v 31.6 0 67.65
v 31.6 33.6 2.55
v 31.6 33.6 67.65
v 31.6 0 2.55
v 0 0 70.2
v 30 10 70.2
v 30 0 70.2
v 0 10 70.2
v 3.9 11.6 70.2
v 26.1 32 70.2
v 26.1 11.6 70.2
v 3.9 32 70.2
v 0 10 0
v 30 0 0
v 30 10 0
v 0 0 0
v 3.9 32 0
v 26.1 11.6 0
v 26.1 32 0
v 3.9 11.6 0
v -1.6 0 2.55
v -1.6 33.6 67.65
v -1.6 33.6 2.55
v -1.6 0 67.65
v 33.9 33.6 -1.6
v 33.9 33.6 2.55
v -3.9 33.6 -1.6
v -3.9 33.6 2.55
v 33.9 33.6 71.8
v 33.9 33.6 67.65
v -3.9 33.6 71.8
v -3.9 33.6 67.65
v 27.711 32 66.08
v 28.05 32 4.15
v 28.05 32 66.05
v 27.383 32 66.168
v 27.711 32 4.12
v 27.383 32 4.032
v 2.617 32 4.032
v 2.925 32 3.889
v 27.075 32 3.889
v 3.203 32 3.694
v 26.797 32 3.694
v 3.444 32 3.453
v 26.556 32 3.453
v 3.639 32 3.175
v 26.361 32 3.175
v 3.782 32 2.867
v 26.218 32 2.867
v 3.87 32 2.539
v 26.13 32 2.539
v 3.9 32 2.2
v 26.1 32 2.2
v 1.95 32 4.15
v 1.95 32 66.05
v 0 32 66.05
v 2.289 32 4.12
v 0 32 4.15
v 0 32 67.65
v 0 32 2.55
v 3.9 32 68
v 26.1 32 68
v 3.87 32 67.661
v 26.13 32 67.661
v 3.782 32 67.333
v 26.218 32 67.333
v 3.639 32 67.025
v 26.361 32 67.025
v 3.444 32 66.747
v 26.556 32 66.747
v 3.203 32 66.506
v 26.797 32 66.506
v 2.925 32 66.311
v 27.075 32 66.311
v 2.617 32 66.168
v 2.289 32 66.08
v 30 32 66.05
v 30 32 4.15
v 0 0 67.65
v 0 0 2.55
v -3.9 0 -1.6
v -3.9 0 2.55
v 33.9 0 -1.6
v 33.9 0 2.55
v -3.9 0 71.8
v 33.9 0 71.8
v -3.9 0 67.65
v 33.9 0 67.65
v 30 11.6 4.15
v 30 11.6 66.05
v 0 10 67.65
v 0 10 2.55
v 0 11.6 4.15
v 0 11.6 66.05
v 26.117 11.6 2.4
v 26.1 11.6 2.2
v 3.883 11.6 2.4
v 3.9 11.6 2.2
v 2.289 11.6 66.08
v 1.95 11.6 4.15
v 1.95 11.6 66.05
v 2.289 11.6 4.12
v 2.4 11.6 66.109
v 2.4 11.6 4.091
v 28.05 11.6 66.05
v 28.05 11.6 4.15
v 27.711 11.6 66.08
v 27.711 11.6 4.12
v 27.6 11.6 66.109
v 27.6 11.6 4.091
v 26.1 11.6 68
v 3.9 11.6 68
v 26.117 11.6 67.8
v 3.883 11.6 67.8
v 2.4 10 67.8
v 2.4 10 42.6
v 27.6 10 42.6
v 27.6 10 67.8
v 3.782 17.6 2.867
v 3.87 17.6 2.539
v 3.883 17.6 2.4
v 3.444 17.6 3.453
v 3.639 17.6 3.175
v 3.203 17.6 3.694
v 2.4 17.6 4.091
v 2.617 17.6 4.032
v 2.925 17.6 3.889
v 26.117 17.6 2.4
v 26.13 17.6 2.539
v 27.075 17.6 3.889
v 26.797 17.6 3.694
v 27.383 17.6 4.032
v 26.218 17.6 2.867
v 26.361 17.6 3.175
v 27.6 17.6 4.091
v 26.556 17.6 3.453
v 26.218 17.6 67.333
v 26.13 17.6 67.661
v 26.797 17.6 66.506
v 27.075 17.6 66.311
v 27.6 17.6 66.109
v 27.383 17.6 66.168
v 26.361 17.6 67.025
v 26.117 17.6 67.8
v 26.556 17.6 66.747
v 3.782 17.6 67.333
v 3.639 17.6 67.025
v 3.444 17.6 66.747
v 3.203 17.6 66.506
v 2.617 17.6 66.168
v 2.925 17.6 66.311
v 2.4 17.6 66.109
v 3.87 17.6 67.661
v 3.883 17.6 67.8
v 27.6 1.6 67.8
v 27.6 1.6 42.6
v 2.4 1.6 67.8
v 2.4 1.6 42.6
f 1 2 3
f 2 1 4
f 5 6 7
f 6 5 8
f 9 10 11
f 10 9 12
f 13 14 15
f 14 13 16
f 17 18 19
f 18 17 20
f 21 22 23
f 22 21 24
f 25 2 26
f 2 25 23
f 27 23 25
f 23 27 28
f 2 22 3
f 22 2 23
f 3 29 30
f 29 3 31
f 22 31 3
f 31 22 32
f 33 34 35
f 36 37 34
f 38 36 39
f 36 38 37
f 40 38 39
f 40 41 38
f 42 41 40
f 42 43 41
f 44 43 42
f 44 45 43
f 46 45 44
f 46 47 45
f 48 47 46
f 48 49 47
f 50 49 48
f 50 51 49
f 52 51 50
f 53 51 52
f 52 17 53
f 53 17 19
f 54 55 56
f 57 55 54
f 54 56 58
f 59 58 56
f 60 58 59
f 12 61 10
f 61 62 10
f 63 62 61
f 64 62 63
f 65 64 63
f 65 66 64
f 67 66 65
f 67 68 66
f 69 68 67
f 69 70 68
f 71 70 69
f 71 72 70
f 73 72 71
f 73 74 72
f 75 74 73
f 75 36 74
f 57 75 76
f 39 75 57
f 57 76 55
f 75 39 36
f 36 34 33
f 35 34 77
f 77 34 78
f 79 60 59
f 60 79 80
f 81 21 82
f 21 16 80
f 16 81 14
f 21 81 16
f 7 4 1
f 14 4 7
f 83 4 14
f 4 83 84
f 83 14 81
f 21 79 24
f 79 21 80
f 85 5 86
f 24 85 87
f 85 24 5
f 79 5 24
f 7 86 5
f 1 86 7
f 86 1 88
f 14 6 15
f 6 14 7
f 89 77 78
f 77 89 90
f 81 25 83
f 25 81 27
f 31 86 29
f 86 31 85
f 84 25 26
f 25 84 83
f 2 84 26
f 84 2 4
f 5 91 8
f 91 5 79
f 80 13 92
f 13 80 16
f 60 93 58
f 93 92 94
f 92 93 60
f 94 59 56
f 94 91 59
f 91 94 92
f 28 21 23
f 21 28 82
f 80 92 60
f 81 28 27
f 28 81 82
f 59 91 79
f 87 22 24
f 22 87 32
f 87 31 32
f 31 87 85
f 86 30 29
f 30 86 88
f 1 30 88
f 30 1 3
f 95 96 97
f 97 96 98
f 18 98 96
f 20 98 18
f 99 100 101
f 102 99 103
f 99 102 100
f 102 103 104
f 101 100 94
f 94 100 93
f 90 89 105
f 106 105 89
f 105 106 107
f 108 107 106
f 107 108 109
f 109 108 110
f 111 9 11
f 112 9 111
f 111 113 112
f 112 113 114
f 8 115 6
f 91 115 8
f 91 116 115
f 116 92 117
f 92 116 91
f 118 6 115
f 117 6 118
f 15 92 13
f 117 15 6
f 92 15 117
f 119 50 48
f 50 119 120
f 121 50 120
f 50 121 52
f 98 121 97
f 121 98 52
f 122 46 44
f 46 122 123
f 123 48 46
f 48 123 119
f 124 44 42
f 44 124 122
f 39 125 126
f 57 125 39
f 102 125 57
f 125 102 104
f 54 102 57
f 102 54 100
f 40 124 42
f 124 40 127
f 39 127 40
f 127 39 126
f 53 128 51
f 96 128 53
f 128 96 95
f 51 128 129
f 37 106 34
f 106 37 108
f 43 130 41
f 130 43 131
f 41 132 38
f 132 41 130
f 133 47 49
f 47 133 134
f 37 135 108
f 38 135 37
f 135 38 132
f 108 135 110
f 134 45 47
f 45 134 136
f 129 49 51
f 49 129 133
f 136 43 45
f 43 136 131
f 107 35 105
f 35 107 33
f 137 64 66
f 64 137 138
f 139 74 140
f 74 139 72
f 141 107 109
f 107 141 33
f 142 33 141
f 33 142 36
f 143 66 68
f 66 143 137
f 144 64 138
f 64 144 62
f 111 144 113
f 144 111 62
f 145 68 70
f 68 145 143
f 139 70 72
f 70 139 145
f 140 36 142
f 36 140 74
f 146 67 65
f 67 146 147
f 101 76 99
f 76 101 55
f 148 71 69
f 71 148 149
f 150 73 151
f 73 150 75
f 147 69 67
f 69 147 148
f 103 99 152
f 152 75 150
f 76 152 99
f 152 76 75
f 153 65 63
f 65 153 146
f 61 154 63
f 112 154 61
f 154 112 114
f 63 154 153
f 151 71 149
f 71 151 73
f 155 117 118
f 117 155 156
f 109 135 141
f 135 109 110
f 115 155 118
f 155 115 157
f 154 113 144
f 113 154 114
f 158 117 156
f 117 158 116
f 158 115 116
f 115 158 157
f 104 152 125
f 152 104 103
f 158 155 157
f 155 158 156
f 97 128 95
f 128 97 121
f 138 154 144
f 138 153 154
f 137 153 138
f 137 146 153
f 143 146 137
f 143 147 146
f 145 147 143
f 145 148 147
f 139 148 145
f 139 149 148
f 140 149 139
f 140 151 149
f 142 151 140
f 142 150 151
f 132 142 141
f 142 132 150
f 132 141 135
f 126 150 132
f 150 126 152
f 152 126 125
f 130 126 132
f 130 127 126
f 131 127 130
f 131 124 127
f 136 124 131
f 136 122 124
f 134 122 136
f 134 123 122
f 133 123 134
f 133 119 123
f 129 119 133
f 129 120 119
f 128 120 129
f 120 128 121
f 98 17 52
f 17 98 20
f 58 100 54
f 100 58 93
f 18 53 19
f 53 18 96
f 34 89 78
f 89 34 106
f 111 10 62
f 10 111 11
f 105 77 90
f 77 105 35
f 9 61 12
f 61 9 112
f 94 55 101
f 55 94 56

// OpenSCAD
$fn=36;
/* [Platine] */
//Gehäuse anzeigen
showcase=true;
//Platine anzeigen
showplatine=true;
//platine länge
pl=70.2;
//platine breite
pw=30;
//lochrand zu lochrand länge
la=68;
//lochrand zu lochrand breite
lab=28.3;
//abstand löcher zum platinenrand in der breite
arb=(pw-lab)/2;
//abstand löcher zum platinenrand in der länge
arl=(pl-la)/2;
//lochdurchmesser
ld=2.2;
//platinendicke
pd=1.6;
//höhe leds mit platinendicke pd
hled=10;
//höhe widerstände mit platinendicke
hw = 5;
//höhe lötzinn mit platinendicke (natürlich von anderer seite)
hz = 6;
//led fläche ca. 25.2 mal 25.2
ledf = 25.2;
//nur die leds (irgendein zylinder mit alutfolie als spiegel :)
ledfi = 18;
//lochdurchmesser schalter
ls = 5; 
//lochdurchmesser buchse
lb = 8;
//schalterbreite max
sbm = 12;
//buchsebreite max
bbm = 12;
//mindesttiefe für schalter und buchse
ts = 25; 
//thickness
t = 1.6;
//Toleranz
to = 4;
//schrauben gewinde innen
sgi = 1.5;
//schraubenlänge
sl = 7.0;
/* [Hidden] */
//Lochzentrum Breite = Radius des Loches + Abstand Rand der Breite
lzb = ld/2+arb;
//Dasselbe für Länge
lzl = ld/2+arl;
//Lz ist der kleiner der beiden Werte
lz = lzb<lzl ? lzb : lzl;
//Die Höhe der LEDs, (mit Platine), die Höhe des Lötzinns, zusätzlicher Puffer)
cd = hled+hz+sbm+to;
//hinter der platine (gleich cd?)
cd2 = (hz-pd)+sbm+to;

//w = inner width of case
//h = inner height of case
//d = inner depth of case
//t = thickness of walls
module case(w, h, d, t)
{
    color("gray")
    //das ganze ein nach links, dann müssen wir bei anderen sachen nicht so viel über die t nachdenken, inkl. toleranzen
    translate([-t,0,0])
    {
        backwall(w,t,h,d);
        leftwall(t,d,h);
        rightwall(t,d,h,w);
        bottomwall(w,d,t);
        topwall(w,d,t,h);
    }
    
    translate([pw,0,-t])
    cube([lzb+lz,cd+t,lzl+lz]);
    
    translate([-lzb-lz,0,-t])
    cube([lzb+lz,cd+t,lzl+lz]);
    
    translate([-lzb-lz,0,pl-lzl-lz+t])
    cube([lzb+lz,cd+t,lzl+lz]);
    
    translate([pw,0,pl-lzl-lz+t])
    cube([lzb+lz,cd+t,lzl+lz]);
}

module backwall(w, t, h, d )
{
    translate([0,d,0])
    cube([w+2*t,t,h]);
}
module leftwall(t, d, h)
{
    cube([t,d,h]);
}
module rightwall(t, d, h, w)
{
    translate([t+w,0,0])
    cube([t,d,h]);
}
module bottomwall(w,d,t)
{
    translate([0,0,-t])
    cube([w+2*t,d+t,t]);
}
module topwall(w,d,t,h)
{
    translate([0,0,h])
    cube([w+2*t,d+t,t]);
}

//pw
//pl
if (showcase)
{
    case(pw,pl,cd,t);
}

//breite der platine = pw
//hoehe der platine = ph
//dicke der platine = pd
module platinenplatte(pw,ph,pd)
{
    color("green")
    cube([pw,pd,ph]);
}

module leds()
{
   translate([0,-(hled-pd),0])
   cube([ledf,hled,ledf]); 
}

module loetzinn()
{
    leda = (pw-ledf)/2;
    
    translate([leda,pd,leda])
    cube([ledf,hz,pl-leda*2]);
}

module leds_nachtlicht()
{
    leda = (pw-ledf)/2;//abstand der großzügigen led fläche zu den rändern oben
    translate([leda,0,pl-ledf-leda])
    color("#6600FF")
    leds();
}

module platine()
{
    if (showplatine)
    {
        platinenplatte(pw,pl,pd);
    }
    translate([0,pd,0])
    cube([lzb+lz,cd2,lzl]);
    translate([0,pd,0])
    cube([lzb,cd2,lzl+lz]);
    
    translate([pw-lzb-lz,pd,0])
    cube([lzb+lz,cd2,lzl]);
    translate([pw-lzb,pd,0])
    cube([lzb,cd2,lzl+lz]);
    
    translate([pw-lzb-lz,pd,pl-lzl])
    cube([lzb+lz,cd2,lzl]);
    translate([pw-lzb,pd,pl-lzl-lz])
    cube([lzb,cd2,lzl+lz]);
    
    translate([0,pd,pl-lzl])
    cube([lzb+lz,cd2,lzl]);
    translate([0,pd,pl-lzl-lz])
    cube([lzb,cd2,lzl+lz]);
       
    translate([lzb,0,lzl])
    {    
        if (showplatine)
        {
            platinenloecher(pd,ld);
        }
        schraubenloecher();
        schraubenhalter();
        //verbinder();        
    }    
    translate([pw-lzb,0,lzl])
    {    
        if (showplatine)
        {
            platinenloecher(pd,ld);
        }
        schraubenloecher();
        schraubenhalter();
    }
    translate([pw-lzb,0,pl-lzl])
    {    
        if (showplatine)
        {
            platinenloecher(pd,ld);
        }
        schraubenloecher();
        schraubenhalter();
    }
    translate([lzb,0,pl-lzl])
    {    
        if (showplatine)
        {
            platinenloecher(pd,ld);
        }
        schraubenloecher();
        schraubenhalter();
    }
    
    if (showplatine)
    {
        //BAUTEIL
        leds_nachtlicht();
    
        loetzinn();
    }
}

//platinendicke
//lochdurchmesser
module platinenloecher(pd,ld)
{
    translate([0,pd,0])
    rotate([90,0,0])
    cylinder(h=pd,d1=ld,d2=ld);
}

module schraubenloecher()
{
    color("green")
    translate([0,sl+pd,0])
    rotate([90,0,0])
    cylinder(h=sl,d1=sgi,d2=sgi);
}

module schraubenhalter()
{
    color("red")
    translate([0,hz+sbm+to,0])
    rotate([90,0,0])
    cylinder(h=cd2,d1=lz*2,d2=lz*2);
}


translate([0,hled,0]) //das ist die platinendicker wieter hinten, und das ist absicht, das ist die toleranz zur front
platine();
